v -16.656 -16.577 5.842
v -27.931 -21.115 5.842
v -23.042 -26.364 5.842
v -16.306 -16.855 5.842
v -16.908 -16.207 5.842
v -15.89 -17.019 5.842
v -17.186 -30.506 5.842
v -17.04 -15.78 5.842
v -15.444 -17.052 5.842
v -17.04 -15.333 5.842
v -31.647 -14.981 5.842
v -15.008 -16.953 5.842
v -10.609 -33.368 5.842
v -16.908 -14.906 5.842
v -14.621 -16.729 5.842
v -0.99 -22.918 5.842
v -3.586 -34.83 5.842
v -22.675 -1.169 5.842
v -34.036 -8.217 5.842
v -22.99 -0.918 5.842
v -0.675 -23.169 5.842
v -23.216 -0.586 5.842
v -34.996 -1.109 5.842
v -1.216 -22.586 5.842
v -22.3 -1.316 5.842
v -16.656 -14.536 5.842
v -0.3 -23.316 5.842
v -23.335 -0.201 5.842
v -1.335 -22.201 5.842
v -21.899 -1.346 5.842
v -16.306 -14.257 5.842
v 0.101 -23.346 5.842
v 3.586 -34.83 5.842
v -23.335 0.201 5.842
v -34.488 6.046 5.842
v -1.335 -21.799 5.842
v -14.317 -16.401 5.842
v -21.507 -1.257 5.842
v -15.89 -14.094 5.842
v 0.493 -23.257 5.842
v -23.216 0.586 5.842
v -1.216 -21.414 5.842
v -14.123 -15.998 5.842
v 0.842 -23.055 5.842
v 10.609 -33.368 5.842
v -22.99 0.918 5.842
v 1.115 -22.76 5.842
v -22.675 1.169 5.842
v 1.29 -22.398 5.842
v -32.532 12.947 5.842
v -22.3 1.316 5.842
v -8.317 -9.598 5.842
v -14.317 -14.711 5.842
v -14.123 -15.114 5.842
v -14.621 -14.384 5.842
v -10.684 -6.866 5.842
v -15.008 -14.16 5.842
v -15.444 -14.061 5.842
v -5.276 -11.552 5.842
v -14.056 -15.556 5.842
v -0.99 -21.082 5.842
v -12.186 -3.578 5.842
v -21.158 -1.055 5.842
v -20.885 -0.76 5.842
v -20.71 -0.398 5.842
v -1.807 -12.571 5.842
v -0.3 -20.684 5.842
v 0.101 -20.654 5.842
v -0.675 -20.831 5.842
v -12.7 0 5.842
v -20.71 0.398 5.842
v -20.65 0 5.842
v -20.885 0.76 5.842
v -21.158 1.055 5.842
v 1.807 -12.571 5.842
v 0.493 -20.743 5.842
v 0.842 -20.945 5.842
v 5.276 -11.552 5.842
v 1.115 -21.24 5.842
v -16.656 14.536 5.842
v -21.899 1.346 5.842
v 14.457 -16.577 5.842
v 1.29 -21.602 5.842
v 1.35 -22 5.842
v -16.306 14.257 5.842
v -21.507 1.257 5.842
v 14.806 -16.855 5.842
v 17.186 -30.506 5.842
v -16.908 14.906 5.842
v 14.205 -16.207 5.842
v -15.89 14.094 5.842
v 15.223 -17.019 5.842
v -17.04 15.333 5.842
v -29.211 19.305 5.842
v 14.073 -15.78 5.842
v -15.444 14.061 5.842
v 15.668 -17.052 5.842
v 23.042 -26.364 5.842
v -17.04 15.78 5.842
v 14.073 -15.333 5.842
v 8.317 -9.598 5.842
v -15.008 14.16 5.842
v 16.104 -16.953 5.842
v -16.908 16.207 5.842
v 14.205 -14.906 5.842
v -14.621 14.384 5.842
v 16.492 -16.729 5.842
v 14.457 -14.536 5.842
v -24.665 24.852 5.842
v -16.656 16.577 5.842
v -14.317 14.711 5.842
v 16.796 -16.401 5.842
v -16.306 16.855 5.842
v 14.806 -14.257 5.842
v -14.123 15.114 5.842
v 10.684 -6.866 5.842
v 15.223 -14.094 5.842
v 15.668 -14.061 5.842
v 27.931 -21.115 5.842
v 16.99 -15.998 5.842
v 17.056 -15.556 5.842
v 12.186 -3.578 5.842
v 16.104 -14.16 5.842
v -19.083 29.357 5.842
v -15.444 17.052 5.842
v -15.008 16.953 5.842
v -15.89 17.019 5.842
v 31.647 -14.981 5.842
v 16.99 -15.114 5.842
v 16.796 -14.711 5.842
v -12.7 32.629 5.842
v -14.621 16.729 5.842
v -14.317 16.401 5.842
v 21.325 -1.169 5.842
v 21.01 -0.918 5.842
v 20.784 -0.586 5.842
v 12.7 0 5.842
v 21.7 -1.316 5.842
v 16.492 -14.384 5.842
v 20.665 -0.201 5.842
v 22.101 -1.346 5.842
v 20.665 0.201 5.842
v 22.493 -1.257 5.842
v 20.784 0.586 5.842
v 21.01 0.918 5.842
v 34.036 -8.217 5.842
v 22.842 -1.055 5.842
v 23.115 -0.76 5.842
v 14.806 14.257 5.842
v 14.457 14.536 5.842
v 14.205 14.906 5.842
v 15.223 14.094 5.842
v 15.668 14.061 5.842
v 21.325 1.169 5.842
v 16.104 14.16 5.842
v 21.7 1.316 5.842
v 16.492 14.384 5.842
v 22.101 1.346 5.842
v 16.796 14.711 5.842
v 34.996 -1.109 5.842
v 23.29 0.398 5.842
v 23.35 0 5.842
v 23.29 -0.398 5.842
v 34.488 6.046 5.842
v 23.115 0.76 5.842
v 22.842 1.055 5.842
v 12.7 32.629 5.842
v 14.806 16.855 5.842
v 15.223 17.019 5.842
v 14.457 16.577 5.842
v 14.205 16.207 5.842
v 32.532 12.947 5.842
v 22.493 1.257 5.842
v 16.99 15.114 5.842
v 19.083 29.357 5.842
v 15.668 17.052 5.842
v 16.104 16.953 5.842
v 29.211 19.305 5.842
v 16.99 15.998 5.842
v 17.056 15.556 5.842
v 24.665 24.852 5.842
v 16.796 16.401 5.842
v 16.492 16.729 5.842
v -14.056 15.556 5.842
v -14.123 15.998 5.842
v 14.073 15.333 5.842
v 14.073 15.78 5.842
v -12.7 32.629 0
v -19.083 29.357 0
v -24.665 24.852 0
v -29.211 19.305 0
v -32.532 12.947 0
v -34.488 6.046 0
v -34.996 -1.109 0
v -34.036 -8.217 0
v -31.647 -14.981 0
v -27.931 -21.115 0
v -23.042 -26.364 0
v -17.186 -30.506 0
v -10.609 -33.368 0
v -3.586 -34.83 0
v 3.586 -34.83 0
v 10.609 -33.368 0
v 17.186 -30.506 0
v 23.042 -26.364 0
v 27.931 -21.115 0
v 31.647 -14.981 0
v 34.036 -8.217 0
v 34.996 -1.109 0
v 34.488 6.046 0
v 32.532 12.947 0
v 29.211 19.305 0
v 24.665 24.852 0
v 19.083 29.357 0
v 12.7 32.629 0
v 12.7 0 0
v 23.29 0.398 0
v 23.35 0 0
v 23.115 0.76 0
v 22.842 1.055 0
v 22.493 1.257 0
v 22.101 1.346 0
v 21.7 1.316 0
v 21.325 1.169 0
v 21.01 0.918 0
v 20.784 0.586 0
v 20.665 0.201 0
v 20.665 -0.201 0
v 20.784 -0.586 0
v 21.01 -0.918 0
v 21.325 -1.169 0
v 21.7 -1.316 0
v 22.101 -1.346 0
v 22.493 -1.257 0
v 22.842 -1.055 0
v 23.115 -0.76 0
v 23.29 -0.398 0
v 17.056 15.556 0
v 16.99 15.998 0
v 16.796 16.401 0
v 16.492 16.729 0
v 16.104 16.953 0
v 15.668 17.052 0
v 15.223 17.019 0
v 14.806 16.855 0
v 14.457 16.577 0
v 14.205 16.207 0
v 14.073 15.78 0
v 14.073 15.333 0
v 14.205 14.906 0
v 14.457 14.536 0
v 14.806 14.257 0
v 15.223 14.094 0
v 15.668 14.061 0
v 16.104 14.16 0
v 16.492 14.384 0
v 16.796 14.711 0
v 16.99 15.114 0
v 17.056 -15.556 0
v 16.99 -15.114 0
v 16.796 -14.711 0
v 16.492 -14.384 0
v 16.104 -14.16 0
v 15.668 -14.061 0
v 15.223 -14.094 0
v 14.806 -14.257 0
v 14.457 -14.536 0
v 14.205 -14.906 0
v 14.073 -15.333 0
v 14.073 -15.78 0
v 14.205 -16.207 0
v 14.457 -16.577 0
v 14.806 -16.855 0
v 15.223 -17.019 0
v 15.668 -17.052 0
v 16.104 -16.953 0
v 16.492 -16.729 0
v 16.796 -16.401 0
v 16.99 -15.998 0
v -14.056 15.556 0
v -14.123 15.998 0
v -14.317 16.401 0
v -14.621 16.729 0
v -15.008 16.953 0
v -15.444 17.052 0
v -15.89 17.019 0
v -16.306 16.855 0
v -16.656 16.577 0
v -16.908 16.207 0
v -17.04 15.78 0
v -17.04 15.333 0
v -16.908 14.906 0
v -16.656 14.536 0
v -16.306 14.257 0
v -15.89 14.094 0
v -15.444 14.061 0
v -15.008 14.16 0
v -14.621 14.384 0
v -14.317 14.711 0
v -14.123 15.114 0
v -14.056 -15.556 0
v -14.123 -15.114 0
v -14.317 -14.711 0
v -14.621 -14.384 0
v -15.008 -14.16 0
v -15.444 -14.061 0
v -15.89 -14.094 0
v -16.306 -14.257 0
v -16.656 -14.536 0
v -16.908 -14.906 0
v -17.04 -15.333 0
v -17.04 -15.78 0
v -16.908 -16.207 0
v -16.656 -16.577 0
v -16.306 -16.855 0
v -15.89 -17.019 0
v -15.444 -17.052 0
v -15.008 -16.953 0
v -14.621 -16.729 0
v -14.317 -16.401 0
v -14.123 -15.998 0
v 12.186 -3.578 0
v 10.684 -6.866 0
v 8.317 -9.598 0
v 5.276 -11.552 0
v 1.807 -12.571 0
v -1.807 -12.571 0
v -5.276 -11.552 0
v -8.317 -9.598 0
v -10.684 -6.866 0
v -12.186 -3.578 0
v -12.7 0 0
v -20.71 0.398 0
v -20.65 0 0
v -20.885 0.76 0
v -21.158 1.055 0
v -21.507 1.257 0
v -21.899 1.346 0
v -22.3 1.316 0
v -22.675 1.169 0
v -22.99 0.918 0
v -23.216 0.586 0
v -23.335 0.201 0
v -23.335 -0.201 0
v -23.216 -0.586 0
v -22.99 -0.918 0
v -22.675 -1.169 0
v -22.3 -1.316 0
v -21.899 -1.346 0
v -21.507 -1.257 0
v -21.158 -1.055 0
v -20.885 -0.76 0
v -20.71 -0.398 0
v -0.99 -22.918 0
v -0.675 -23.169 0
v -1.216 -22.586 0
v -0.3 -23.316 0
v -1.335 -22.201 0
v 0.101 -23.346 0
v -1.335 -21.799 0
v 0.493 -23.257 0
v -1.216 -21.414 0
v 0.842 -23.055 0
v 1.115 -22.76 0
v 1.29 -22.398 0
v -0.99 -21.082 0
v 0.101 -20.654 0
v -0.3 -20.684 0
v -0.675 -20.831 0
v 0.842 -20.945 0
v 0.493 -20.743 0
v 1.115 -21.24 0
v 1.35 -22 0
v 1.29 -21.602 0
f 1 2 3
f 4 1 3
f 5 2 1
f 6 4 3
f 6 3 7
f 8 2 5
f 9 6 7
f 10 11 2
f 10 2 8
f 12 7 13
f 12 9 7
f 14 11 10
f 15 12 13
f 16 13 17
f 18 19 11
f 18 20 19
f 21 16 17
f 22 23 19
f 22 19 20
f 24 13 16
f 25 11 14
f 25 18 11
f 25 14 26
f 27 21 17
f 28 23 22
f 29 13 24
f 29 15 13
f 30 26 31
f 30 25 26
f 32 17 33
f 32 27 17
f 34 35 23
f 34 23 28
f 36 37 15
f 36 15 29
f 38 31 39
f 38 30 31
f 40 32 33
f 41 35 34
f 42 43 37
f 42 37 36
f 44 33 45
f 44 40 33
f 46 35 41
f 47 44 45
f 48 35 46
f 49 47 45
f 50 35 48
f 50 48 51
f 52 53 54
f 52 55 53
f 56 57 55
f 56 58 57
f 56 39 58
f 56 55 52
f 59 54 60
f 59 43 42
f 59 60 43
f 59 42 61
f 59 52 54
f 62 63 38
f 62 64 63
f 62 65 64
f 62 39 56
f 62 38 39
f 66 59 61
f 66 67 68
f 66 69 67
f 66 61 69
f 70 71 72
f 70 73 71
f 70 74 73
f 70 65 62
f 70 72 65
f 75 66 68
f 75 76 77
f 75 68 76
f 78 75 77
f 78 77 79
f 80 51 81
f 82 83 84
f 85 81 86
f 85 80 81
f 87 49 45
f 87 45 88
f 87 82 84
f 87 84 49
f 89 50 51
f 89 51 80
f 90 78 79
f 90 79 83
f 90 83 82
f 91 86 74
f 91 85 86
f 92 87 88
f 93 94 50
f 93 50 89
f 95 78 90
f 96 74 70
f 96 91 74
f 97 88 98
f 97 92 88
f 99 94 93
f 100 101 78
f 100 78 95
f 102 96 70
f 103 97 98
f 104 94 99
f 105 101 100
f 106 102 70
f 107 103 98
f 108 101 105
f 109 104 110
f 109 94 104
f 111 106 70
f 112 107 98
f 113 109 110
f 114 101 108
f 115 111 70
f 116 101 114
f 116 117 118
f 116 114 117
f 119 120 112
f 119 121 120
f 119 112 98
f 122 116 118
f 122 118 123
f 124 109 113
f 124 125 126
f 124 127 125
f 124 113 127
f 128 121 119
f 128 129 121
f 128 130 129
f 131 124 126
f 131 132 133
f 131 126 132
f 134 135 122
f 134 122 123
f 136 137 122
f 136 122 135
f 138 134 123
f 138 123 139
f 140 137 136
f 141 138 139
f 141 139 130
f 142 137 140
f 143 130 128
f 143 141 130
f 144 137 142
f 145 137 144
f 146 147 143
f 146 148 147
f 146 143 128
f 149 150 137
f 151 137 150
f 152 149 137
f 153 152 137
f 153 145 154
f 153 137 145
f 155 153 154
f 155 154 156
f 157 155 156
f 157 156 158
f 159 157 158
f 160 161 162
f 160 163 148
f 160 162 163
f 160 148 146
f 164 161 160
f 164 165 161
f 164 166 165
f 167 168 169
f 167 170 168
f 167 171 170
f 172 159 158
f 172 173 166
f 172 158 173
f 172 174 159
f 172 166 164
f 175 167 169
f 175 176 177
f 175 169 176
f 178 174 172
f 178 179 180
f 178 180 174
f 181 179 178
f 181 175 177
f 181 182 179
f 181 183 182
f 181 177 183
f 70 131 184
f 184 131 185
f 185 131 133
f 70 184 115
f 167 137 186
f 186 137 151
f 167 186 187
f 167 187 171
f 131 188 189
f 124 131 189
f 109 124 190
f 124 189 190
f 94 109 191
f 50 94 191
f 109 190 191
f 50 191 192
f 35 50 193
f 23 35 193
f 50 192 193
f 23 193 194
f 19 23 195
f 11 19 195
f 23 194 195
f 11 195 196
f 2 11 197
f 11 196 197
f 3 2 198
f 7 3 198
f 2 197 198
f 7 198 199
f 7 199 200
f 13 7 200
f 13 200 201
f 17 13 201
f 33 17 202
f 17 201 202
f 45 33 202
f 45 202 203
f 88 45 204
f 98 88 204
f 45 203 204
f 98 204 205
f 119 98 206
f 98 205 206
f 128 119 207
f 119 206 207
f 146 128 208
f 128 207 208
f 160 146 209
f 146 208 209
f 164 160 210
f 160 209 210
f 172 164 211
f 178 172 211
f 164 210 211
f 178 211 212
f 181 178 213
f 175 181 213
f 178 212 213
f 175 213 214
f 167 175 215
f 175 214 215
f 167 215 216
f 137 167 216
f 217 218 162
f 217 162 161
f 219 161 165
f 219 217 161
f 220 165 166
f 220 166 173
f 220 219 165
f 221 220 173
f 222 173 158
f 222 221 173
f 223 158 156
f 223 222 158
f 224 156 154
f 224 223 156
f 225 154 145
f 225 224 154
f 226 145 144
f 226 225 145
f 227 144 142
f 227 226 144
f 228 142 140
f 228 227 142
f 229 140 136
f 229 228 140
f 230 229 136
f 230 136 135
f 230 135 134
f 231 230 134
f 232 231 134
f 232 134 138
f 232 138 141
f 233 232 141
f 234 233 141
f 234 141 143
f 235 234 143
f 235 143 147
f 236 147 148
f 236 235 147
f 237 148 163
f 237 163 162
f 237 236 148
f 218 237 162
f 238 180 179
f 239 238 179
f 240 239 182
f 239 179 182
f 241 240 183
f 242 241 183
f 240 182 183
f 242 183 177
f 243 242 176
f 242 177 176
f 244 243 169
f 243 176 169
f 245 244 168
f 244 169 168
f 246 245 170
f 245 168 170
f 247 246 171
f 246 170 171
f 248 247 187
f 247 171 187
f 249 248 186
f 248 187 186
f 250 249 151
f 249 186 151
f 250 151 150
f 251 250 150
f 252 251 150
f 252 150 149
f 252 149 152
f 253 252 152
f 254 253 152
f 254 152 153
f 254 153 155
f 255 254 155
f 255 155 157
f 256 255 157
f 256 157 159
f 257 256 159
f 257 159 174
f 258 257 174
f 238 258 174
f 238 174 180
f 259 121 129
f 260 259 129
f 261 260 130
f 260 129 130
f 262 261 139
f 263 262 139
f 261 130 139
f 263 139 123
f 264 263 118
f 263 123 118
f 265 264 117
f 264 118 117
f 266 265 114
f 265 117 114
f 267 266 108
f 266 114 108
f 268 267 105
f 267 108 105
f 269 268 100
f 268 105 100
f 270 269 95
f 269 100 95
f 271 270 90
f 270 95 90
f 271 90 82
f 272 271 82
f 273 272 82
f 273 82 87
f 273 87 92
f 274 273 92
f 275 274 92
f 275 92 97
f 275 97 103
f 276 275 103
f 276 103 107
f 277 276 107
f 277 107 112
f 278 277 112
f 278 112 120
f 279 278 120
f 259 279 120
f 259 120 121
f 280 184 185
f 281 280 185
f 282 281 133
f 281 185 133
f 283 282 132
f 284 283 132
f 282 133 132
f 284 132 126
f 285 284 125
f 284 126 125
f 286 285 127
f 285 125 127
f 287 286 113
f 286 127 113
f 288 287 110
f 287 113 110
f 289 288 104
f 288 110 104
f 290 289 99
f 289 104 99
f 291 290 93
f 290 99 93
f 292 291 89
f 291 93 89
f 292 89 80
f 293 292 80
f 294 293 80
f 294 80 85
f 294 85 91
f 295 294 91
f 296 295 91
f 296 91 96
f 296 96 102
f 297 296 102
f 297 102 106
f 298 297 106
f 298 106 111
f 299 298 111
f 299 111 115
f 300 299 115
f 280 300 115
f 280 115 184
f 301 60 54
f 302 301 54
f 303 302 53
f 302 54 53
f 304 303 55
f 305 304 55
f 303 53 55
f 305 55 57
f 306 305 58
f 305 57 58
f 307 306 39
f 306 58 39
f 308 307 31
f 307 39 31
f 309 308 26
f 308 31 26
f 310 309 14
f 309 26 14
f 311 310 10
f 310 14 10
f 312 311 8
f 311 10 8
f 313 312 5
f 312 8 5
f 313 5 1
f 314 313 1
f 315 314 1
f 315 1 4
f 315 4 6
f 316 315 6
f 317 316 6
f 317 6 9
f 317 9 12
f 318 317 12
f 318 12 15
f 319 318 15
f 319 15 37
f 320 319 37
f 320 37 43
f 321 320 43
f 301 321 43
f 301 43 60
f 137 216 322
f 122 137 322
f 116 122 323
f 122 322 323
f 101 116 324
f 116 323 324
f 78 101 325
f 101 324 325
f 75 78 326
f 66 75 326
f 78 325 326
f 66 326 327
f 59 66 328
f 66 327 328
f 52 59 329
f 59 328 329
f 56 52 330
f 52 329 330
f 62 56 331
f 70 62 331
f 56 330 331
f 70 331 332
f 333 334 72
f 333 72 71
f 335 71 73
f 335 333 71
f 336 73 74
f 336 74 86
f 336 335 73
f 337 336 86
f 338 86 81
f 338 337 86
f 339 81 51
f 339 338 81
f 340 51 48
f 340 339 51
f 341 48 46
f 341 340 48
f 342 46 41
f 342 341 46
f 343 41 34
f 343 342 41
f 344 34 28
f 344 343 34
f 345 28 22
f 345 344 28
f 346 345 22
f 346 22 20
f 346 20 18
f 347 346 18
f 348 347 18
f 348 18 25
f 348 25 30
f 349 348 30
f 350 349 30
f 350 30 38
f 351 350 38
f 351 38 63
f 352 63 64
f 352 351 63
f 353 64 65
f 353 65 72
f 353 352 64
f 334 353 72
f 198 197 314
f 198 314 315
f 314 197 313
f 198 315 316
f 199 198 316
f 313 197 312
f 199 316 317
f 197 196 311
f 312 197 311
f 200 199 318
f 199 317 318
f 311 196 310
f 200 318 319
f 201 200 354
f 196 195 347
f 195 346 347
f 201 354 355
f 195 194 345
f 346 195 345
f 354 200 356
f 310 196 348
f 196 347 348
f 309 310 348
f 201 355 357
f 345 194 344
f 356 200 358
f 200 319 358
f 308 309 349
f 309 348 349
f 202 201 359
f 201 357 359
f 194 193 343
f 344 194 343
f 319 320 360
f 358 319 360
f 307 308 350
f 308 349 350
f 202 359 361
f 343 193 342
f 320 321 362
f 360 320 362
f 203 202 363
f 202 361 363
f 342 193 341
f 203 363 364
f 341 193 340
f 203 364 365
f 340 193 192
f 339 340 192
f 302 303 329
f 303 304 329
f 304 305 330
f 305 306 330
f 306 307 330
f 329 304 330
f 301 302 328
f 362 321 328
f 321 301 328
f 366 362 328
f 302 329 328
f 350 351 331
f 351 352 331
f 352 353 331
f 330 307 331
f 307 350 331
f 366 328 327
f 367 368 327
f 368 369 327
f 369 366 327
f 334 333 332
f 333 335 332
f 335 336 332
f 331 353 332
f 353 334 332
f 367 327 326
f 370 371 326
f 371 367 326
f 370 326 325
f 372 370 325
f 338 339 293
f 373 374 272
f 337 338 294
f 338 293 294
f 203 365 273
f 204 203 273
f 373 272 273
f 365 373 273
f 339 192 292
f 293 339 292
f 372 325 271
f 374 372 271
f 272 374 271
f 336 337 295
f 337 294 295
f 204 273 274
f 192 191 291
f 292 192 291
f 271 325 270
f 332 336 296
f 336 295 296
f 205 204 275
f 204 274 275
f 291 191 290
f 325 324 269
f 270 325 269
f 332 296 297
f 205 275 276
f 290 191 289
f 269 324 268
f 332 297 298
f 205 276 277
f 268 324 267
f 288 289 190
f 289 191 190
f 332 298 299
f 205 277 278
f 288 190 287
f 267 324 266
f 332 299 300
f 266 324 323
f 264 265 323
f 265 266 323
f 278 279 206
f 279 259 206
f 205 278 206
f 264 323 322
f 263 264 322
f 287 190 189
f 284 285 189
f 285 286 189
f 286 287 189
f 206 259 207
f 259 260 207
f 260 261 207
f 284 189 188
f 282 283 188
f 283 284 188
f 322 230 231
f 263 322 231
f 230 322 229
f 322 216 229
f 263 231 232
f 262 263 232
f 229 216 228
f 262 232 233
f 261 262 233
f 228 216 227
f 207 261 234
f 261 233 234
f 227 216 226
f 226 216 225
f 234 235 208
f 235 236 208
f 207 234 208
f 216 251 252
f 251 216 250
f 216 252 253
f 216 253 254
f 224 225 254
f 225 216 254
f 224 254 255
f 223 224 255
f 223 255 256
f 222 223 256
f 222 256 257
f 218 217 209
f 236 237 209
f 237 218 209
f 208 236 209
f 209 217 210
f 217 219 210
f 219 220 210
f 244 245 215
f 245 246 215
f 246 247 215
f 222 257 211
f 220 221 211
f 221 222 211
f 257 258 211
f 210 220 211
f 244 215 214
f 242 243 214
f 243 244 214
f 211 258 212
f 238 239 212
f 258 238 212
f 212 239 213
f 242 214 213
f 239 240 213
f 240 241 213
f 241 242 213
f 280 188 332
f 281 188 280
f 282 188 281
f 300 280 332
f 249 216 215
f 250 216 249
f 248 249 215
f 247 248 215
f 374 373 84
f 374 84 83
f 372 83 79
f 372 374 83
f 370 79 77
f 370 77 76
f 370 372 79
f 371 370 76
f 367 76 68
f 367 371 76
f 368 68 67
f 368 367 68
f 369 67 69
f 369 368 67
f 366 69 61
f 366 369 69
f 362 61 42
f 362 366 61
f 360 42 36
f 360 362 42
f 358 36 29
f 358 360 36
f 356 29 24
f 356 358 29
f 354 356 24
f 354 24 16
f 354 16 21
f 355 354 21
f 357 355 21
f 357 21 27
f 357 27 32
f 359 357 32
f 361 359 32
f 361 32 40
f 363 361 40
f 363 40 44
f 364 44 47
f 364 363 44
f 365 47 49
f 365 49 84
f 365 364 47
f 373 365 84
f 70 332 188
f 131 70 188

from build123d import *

# Parameters (mm, degrees)
SKETCH1_R           = 1.35
BOSS_EXTRUDE1_DEPTH = 5.842
SKETCH2_R           = 1.5
CUT_EXTRUDE1_DEPTH  = 50.860559066


with BuildPart() as part:
    # Sketch1 → Boss-Extrude1 (new body)
    with BuildSketch(Plane.XY):
        with BuildLine():
            Line((-12.7, 0), (-12.7, 32.629483496))
            ThreePointArc((-12.7, 32.629483496), (0, -35.0139), (12.7, 32.629483496))
            Line((12.7, 32.629483496), (12.7, 0))
            ThreePointArc((12.7, 0), (0, -12.7), (-12.7, 0))
        make_face()
        with Locations((22, 0)):
            Circle(SKETCH1_R, mode=Mode.SUBTRACT)
        with Locations((0, -22)):
            Circle(SKETCH1_R, mode=Mode.SUBTRACT)
        with Locations((-22, 0)):
            Circle(SKETCH1_R, mode=Mode.SUBTRACT)
    extrude(amount=BOSS_EXTRUDE1_DEPTH)

    # Sketch2 → Cut-Extrude1 (cut, through all)
    with BuildSketch(Plane.XY.offset(5.842)):
        with Locations((-15.556349186, -15.556349186)):
            Circle(SKETCH2_R)
        with Locations((-15.556349186, 15.556349186)):
            Circle(SKETCH2_R)
        with Locations((15.556349186, 15.556349186)):
            Circle(SKETCH2_R)
        with Locations((15.556349186, -15.556349186)):
            Circle(SKETCH2_R)
    extrude(amount=-CUT_EXTRUDE1_DEPTH, mode=Mode.SUBTRACT)


solid = part.part
